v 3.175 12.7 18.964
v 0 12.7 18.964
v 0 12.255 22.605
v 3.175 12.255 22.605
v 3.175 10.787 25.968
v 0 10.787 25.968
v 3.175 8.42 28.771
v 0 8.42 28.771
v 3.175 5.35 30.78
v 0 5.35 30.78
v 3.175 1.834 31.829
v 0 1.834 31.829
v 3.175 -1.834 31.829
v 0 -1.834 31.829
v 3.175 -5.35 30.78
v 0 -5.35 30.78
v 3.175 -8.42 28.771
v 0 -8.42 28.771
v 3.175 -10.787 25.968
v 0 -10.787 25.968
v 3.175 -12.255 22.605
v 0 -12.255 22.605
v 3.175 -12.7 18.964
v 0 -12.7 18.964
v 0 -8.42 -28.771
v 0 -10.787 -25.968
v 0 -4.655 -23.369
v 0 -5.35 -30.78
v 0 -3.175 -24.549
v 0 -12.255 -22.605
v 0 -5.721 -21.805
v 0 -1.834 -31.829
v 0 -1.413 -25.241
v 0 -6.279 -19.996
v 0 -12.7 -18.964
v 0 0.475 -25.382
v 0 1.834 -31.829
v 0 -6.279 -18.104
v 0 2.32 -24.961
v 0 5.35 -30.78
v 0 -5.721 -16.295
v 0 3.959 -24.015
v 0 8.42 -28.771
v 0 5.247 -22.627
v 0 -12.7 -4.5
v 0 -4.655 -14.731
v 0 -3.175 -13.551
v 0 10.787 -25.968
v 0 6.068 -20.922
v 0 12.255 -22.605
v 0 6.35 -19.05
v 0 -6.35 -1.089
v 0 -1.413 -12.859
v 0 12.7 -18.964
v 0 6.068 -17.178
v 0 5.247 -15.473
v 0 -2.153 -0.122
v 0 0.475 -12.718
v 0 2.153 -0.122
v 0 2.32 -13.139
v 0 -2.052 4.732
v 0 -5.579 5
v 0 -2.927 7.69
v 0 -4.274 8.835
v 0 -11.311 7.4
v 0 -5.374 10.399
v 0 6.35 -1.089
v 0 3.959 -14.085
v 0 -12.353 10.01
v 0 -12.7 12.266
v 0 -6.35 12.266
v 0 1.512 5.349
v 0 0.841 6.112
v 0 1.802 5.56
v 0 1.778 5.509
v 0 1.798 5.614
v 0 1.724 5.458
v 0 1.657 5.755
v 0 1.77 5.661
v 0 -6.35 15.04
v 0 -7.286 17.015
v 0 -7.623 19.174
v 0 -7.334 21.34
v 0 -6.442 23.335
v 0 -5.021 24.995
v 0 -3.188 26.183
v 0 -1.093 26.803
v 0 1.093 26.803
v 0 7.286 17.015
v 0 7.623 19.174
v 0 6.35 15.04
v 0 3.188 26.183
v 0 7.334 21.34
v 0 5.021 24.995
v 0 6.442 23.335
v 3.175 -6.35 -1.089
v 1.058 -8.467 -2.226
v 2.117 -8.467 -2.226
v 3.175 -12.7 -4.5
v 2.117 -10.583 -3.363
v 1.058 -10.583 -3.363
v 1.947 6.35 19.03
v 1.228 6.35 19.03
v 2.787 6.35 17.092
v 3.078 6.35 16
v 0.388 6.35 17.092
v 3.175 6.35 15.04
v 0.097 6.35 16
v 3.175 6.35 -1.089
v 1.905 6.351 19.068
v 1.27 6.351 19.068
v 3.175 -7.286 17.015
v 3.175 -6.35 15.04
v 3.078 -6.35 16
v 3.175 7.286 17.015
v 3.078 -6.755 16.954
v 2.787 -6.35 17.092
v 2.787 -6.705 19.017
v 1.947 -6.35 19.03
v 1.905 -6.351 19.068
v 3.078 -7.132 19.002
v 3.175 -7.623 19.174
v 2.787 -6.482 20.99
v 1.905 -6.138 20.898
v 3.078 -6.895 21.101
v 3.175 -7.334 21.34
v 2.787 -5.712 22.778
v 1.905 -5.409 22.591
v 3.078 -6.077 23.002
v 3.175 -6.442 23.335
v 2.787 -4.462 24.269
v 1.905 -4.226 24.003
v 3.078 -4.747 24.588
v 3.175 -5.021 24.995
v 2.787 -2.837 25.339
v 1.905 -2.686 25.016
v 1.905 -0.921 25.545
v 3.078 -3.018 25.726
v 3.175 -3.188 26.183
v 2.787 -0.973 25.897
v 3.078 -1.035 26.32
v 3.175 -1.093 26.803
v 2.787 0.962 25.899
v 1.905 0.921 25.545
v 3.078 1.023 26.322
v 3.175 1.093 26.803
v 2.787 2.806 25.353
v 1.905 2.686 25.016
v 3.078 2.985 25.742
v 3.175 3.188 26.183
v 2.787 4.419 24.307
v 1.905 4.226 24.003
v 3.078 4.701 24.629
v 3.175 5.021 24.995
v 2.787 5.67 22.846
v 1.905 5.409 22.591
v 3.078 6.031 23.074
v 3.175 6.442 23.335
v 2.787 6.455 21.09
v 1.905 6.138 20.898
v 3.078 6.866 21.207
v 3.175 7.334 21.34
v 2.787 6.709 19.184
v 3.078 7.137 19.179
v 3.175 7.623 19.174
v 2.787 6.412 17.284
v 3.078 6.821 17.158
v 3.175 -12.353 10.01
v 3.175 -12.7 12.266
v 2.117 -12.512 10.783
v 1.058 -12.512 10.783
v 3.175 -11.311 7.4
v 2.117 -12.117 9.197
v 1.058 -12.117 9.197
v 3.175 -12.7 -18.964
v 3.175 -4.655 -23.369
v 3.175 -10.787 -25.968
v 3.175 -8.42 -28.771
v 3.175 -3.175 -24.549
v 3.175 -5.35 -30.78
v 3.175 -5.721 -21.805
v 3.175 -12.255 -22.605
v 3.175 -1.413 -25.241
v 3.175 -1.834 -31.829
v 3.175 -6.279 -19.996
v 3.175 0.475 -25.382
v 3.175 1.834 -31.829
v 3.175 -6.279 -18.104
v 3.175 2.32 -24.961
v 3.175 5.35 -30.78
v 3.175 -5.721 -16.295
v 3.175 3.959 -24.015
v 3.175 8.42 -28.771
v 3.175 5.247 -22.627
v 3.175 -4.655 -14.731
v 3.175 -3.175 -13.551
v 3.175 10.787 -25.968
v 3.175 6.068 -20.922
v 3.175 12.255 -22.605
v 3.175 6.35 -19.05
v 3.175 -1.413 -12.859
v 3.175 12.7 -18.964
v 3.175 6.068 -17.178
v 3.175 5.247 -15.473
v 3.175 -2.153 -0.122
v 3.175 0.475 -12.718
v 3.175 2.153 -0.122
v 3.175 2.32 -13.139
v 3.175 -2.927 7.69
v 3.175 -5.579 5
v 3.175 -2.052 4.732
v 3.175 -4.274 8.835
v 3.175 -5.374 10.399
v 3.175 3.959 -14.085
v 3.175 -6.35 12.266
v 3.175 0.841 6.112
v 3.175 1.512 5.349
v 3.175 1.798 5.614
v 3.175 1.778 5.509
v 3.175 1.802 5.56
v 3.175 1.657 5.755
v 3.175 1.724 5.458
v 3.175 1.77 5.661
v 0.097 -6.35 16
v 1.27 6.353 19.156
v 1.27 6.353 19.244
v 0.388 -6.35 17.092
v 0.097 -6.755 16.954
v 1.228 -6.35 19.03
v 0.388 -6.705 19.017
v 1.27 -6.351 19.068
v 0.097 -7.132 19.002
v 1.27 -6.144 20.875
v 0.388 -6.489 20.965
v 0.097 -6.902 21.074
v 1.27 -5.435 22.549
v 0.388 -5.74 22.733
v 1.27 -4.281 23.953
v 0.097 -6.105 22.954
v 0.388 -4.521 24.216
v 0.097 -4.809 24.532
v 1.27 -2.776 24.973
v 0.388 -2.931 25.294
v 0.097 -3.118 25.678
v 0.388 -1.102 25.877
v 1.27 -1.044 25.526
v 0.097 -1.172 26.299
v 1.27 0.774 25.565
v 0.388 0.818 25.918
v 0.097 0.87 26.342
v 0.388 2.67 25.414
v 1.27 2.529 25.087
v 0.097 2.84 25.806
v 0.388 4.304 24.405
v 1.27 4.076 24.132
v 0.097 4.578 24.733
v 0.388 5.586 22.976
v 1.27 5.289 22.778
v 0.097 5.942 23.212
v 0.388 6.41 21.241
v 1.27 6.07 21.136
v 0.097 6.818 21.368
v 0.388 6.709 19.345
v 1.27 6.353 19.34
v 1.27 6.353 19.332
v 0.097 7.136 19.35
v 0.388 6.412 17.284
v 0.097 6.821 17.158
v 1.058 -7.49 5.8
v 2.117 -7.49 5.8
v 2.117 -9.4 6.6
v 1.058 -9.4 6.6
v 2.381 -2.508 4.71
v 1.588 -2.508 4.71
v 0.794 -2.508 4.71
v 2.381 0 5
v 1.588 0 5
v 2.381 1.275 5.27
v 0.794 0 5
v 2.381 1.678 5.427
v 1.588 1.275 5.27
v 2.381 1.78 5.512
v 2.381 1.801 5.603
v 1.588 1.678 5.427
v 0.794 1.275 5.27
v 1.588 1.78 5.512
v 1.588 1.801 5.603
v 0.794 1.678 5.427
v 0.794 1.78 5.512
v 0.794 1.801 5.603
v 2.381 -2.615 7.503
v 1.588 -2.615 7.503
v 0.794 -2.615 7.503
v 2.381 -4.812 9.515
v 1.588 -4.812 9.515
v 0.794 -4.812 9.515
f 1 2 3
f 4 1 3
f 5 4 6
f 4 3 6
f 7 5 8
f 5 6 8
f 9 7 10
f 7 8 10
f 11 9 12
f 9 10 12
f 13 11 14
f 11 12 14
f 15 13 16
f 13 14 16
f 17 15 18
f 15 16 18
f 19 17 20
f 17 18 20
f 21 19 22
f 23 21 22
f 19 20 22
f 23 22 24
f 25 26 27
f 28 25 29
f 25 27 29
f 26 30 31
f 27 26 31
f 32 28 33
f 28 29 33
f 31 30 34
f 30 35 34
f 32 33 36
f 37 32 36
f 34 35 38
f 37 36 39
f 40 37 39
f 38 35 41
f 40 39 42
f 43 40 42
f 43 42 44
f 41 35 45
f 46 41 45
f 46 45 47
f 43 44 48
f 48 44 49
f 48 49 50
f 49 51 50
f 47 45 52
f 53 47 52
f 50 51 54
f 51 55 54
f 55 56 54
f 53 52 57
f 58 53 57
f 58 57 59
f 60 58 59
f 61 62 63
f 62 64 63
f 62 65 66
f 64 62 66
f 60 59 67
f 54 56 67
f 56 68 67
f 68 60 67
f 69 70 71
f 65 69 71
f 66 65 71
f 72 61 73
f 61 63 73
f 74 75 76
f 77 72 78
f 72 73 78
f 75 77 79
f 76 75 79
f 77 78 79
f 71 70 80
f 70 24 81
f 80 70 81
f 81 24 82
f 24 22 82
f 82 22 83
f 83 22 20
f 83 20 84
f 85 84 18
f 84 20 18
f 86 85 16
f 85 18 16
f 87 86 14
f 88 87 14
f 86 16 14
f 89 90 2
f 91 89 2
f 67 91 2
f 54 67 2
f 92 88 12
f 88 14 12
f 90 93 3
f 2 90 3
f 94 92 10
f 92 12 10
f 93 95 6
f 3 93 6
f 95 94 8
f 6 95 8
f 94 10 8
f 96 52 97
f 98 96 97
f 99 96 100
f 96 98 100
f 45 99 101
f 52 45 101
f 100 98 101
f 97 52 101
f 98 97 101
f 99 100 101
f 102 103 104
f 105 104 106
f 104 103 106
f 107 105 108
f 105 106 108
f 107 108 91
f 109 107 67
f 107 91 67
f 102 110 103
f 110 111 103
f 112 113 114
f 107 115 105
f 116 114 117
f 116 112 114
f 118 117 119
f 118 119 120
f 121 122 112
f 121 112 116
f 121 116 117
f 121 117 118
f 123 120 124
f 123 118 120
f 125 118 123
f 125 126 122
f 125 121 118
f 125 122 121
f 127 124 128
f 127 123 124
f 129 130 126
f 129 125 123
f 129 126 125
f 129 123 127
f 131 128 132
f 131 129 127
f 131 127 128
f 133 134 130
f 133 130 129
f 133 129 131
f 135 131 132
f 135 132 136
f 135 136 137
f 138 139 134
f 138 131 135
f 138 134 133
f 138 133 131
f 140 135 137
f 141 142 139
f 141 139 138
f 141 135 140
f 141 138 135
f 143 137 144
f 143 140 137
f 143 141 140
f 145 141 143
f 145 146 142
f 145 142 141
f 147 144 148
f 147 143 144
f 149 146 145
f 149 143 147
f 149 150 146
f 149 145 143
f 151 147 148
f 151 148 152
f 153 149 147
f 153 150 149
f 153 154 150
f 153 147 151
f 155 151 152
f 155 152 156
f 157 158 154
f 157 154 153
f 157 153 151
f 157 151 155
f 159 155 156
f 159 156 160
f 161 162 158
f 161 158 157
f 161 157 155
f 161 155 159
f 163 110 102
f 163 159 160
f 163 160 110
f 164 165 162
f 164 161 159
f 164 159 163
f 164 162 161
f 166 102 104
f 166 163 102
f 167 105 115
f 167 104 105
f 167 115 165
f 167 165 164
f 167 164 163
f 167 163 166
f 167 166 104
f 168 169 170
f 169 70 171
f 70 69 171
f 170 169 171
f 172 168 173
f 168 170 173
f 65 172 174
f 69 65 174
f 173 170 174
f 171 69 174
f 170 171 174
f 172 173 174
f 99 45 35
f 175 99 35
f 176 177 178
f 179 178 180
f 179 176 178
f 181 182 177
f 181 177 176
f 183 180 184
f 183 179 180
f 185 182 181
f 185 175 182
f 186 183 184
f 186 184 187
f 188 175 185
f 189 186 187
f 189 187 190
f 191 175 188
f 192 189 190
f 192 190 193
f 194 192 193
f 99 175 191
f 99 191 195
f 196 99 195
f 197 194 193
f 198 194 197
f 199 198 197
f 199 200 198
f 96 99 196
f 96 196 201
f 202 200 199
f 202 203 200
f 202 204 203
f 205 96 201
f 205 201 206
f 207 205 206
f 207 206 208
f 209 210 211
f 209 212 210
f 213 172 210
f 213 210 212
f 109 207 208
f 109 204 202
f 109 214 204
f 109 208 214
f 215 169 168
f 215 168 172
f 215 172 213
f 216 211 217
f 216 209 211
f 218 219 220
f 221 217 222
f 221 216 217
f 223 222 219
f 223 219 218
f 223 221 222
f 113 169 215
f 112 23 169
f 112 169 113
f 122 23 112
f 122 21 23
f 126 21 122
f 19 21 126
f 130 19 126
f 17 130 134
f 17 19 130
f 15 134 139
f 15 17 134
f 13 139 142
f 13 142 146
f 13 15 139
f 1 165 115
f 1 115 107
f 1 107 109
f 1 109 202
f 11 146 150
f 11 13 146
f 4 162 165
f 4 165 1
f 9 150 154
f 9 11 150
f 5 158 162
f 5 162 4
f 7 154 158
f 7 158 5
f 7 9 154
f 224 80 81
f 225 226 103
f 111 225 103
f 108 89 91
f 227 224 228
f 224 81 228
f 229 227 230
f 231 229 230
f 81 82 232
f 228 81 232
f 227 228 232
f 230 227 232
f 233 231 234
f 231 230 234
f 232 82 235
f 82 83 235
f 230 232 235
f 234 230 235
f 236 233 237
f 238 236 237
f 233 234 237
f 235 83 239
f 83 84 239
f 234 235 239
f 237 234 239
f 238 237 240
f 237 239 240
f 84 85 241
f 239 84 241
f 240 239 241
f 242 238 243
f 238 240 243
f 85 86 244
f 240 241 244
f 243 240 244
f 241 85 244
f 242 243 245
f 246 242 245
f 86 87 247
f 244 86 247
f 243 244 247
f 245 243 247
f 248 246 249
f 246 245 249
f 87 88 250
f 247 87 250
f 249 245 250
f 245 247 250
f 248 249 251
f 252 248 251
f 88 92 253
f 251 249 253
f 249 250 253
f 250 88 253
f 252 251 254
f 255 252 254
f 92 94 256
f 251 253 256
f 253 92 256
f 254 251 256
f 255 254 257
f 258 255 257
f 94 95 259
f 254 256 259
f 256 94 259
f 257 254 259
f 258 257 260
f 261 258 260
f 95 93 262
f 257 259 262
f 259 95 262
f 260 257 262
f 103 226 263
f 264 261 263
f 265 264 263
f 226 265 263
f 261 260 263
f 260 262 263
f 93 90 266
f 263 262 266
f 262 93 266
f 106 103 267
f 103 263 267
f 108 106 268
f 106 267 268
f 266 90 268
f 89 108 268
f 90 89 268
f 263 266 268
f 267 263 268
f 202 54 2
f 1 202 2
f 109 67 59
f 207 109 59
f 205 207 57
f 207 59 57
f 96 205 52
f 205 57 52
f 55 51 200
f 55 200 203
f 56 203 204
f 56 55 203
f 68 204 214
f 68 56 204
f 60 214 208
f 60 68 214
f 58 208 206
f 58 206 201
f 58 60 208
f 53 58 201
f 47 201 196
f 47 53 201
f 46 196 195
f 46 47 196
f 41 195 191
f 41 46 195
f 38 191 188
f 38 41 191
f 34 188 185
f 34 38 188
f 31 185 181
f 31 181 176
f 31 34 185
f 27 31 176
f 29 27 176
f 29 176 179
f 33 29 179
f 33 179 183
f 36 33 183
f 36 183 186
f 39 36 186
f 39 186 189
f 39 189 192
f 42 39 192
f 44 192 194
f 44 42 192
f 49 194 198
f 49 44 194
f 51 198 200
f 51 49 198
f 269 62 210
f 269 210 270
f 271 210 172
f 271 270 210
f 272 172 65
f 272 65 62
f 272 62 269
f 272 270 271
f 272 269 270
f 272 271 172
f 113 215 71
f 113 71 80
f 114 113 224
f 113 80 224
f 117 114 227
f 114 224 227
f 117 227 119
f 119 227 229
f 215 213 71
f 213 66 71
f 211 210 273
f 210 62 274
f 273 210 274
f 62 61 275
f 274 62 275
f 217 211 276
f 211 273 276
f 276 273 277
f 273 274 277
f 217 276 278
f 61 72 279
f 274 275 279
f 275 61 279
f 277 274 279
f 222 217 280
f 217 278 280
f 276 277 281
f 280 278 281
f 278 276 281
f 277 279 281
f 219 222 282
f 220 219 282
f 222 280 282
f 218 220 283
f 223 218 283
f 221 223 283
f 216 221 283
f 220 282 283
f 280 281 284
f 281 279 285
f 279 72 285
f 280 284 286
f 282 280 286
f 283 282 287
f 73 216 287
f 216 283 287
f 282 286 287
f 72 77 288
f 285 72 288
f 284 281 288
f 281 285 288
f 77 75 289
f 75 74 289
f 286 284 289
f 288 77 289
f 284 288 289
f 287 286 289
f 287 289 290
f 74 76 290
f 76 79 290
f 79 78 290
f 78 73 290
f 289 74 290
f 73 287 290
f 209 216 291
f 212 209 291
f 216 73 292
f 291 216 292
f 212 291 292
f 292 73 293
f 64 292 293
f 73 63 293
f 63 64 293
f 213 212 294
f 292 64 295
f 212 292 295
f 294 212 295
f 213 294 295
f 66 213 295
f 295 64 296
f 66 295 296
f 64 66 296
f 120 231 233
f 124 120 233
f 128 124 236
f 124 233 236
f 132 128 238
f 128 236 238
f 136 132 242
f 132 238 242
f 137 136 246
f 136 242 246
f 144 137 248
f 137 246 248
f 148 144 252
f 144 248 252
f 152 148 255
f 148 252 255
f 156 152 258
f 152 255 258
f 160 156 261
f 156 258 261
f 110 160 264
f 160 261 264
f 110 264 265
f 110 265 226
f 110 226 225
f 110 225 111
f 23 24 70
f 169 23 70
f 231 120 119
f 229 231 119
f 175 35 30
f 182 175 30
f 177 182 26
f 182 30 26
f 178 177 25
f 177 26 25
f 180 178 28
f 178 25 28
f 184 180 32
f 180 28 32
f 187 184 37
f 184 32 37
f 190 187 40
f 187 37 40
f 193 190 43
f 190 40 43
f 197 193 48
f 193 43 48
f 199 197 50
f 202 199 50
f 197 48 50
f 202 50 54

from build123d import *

# Parameters (mm, degrees)
F0_R        = 6.35
F1_DEPTH    = 3.175
F2_T1_DEPTH = 3.2744561413
F2_T4_ANGLE = 281.2740332969
F2_T6_ANGLE = 281.2740332969


# Not quite as in the source:
# - a fillet or chamfer that OpenCascade refuses, or shapes differently, is made with other operations: its cross-section is extruded or revolved along the edge and cut away or added


with BuildPart() as f1:
    # F0 (on Right) → F1 (new body)
    with BuildSketch(Plane.YZ):
        with BuildLine():
            Line((6.35, 19.05), (6.35, -1.0894877579))
            ThreePointArc((6.35, -1.0894877579), (0, 0), (-6.35, -1.0894877579))
            add(Edge.make_bspline(
                [(-6.35, -1.0894877579), (-8.4666666667, -2.2262237484), (-10.5833333333, -3.3629597389), (-12.7, -4.4996957295)],
                knots=[0, 0, 0, 0, 7.2077748584, 7.2077748584, 7.2077748584, 7.2077748584], degree=3))
            Line((-12.7, -4.4996957295), (-12.7, -18.9636734782))
            ThreePointArc((-12.7, -18.9636734782), (0, -31.9618793041), (12.7, -18.9636734782))
            Line((12.7, -18.9636734782), (12.7, 18.9636734782))
            ThreePointArc((12.7, 18.9636734782), (0, 31.9618793041), (-12.7, 18.9636734782))
            Line((-12.7, 18.9636734782), (-12.7, 12.2655965388))
            add(Edge.make_bspline(
                [(-12.7, 12.2655965388), (-12.5460680886, 10.8009133444), (-12.3921361771, 9.3362301501), (-11.3107701764, 7.4001117609)],
                knots=[0, 0, 0, 0, 0.2800418332, 0.2800418332, 0.2800418332, 0.2800418332], degree=3))
            add(Edge.make_bspline(
                [(-5.5794117662, 5), (-7.4898645696, 5.8000372536), (-9.400317373, 6.6000745073), (-11.3107701764, 7.4001117609)],
                knots=[0, 0, 0, 0, 6.2136145432, 6.2136145432, 6.2136145432, 6.2136145432], degree=3))
            add(Edge.make_bspline(
                [(-5.5794117662, 5), (-5.5956610435, 6.8858619014), (-5.9728305218, 9.5757292201), (-6.35, 12.2655965388)],
                knots=[0.7796078974, 0.7796078974, 0.7796078974, 0.7796078974, 1, 1, 1, 1], degree=3))
            Line((-6.35, 12.2655965388), (-6.35, 19.05))
            ThreePointArc((-6.35, 19.05), (0, 25.6118793041), (6.35, 19.05))
        make_face()
        with Locations((0, -19.05)):
            Circle(F0_R, mode=Mode.SUBTRACT)
        with BuildLine():
            add(Edge.make_bspline(
                [(-5.5794117662, 5), (-3.2248544463, 4.5091538123), (-0.6564824192, 4.8391769932), (3.3416252338, 5.6570567656), (-3.834716226, 7.1463236629), (-5.3129484548, 10.1981831131), (-6.35, 12.2655965388)],
                knots=[0, 0, 0, 0, 0.2814277691, 0.4456370567, 0.7068849416, 1, 1, 1, 1], degree=3))
            add(Edge.make_bspline(
                [(-5.5794117662, 5), (-5.5956610435, 6.8858619014), (-5.9728305218, 9.5757292201), (-6.35, 12.2655965388)],
                knots=[0.7796078974, 0.7796078974, 0.7796078974, 0.7796078974, 1, 1, 1, 1], degree=3))
        make_face()
    extrude(amount=F1_DEPTH)

    # F2: fillet of radius 1.27 on 4 edges, made by hand

    # F2_s2 → F2_t1 (cut)
    with BuildSketch(Plane.YZ.offset(-0.0497280707)):
        with BuildLine():
            ThreePointArc((-6.3505698659, 19.0681499948), (-6.3501424745, 19.0491315173), (-6.35, 19.0301087717))
            Line((-6.35, 19.0301087717), (-6.35, 19.05))
            ThreePointArc((-6.35, 19.05), (-6.3502914173, 19.0590747938), (-6.3505698659, 19.0681499948))
        make_face()
        with BuildLine():
            ThreePointArc((6.3505698659, 19.0681499948), (6.3501424745, 19.0491315173), (6.35, 19.0301087717))
            Line((6.35, 19.0301087717), (6.35, 19.05))
            ThreePointArc((6.35, 19.05), (6.3502914173, 19.0590747938), (6.3505698659, 19.0681499948))
        make_face()
    extrude(amount=F2_T1_DEPTH, mode=Mode.SUBTRACT)

    # F2_s3 → F2_t4 (revolve, cut)
    with BuildSketch(Plane(origin=(0, -9.4434175303, 7.7466985416), x_dir=(1, 0, 0), z_dir=(0, 0.7731434877, -0.6342311467))):
        with BuildLine():
            ThreePointArc((1.27, -8.5361310993), (0.3719743879, -8.1641567114), (0, -7.2661310993))
            Line((0, -7.2661310993), (0, -8.5361310993))
            Line((0, -8.5361310993), (1.27, -8.5361310993))
        make_face()
    revolve(axis=Axis((0, 0, 19.2584585737), (-1, 0, 0)), revolution_arc=F2_T4_ANGLE, mode=Mode.SUBTRACT)

    # F2_s5 → F2_t6 (revolve, cut)
    with BuildSketch(Plane(origin=(0, -9.4434175303, 7.7466985416), x_dir=(1, 0, 0), z_dir=(0, 0.7731434877, -0.6342311467))):
        with BuildLine():
            ThreePointArc((1.905, -8.5361310993), (2.8030256121, -8.1641567114), (3.175, -7.2661310993))
            Line((3.175, -7.2661310993), (3.175, -8.5361310993))
            Line((3.175, -8.5361310993), (1.905, -8.5361310993))
        make_face()
    revolve(axis=Axis((3.175, 0, 19.2584585737), (-1, 0, 0)), revolution_arc=F2_T6_ANGLE, mode=Mode.SUBTRACT)


solid = f1.part
